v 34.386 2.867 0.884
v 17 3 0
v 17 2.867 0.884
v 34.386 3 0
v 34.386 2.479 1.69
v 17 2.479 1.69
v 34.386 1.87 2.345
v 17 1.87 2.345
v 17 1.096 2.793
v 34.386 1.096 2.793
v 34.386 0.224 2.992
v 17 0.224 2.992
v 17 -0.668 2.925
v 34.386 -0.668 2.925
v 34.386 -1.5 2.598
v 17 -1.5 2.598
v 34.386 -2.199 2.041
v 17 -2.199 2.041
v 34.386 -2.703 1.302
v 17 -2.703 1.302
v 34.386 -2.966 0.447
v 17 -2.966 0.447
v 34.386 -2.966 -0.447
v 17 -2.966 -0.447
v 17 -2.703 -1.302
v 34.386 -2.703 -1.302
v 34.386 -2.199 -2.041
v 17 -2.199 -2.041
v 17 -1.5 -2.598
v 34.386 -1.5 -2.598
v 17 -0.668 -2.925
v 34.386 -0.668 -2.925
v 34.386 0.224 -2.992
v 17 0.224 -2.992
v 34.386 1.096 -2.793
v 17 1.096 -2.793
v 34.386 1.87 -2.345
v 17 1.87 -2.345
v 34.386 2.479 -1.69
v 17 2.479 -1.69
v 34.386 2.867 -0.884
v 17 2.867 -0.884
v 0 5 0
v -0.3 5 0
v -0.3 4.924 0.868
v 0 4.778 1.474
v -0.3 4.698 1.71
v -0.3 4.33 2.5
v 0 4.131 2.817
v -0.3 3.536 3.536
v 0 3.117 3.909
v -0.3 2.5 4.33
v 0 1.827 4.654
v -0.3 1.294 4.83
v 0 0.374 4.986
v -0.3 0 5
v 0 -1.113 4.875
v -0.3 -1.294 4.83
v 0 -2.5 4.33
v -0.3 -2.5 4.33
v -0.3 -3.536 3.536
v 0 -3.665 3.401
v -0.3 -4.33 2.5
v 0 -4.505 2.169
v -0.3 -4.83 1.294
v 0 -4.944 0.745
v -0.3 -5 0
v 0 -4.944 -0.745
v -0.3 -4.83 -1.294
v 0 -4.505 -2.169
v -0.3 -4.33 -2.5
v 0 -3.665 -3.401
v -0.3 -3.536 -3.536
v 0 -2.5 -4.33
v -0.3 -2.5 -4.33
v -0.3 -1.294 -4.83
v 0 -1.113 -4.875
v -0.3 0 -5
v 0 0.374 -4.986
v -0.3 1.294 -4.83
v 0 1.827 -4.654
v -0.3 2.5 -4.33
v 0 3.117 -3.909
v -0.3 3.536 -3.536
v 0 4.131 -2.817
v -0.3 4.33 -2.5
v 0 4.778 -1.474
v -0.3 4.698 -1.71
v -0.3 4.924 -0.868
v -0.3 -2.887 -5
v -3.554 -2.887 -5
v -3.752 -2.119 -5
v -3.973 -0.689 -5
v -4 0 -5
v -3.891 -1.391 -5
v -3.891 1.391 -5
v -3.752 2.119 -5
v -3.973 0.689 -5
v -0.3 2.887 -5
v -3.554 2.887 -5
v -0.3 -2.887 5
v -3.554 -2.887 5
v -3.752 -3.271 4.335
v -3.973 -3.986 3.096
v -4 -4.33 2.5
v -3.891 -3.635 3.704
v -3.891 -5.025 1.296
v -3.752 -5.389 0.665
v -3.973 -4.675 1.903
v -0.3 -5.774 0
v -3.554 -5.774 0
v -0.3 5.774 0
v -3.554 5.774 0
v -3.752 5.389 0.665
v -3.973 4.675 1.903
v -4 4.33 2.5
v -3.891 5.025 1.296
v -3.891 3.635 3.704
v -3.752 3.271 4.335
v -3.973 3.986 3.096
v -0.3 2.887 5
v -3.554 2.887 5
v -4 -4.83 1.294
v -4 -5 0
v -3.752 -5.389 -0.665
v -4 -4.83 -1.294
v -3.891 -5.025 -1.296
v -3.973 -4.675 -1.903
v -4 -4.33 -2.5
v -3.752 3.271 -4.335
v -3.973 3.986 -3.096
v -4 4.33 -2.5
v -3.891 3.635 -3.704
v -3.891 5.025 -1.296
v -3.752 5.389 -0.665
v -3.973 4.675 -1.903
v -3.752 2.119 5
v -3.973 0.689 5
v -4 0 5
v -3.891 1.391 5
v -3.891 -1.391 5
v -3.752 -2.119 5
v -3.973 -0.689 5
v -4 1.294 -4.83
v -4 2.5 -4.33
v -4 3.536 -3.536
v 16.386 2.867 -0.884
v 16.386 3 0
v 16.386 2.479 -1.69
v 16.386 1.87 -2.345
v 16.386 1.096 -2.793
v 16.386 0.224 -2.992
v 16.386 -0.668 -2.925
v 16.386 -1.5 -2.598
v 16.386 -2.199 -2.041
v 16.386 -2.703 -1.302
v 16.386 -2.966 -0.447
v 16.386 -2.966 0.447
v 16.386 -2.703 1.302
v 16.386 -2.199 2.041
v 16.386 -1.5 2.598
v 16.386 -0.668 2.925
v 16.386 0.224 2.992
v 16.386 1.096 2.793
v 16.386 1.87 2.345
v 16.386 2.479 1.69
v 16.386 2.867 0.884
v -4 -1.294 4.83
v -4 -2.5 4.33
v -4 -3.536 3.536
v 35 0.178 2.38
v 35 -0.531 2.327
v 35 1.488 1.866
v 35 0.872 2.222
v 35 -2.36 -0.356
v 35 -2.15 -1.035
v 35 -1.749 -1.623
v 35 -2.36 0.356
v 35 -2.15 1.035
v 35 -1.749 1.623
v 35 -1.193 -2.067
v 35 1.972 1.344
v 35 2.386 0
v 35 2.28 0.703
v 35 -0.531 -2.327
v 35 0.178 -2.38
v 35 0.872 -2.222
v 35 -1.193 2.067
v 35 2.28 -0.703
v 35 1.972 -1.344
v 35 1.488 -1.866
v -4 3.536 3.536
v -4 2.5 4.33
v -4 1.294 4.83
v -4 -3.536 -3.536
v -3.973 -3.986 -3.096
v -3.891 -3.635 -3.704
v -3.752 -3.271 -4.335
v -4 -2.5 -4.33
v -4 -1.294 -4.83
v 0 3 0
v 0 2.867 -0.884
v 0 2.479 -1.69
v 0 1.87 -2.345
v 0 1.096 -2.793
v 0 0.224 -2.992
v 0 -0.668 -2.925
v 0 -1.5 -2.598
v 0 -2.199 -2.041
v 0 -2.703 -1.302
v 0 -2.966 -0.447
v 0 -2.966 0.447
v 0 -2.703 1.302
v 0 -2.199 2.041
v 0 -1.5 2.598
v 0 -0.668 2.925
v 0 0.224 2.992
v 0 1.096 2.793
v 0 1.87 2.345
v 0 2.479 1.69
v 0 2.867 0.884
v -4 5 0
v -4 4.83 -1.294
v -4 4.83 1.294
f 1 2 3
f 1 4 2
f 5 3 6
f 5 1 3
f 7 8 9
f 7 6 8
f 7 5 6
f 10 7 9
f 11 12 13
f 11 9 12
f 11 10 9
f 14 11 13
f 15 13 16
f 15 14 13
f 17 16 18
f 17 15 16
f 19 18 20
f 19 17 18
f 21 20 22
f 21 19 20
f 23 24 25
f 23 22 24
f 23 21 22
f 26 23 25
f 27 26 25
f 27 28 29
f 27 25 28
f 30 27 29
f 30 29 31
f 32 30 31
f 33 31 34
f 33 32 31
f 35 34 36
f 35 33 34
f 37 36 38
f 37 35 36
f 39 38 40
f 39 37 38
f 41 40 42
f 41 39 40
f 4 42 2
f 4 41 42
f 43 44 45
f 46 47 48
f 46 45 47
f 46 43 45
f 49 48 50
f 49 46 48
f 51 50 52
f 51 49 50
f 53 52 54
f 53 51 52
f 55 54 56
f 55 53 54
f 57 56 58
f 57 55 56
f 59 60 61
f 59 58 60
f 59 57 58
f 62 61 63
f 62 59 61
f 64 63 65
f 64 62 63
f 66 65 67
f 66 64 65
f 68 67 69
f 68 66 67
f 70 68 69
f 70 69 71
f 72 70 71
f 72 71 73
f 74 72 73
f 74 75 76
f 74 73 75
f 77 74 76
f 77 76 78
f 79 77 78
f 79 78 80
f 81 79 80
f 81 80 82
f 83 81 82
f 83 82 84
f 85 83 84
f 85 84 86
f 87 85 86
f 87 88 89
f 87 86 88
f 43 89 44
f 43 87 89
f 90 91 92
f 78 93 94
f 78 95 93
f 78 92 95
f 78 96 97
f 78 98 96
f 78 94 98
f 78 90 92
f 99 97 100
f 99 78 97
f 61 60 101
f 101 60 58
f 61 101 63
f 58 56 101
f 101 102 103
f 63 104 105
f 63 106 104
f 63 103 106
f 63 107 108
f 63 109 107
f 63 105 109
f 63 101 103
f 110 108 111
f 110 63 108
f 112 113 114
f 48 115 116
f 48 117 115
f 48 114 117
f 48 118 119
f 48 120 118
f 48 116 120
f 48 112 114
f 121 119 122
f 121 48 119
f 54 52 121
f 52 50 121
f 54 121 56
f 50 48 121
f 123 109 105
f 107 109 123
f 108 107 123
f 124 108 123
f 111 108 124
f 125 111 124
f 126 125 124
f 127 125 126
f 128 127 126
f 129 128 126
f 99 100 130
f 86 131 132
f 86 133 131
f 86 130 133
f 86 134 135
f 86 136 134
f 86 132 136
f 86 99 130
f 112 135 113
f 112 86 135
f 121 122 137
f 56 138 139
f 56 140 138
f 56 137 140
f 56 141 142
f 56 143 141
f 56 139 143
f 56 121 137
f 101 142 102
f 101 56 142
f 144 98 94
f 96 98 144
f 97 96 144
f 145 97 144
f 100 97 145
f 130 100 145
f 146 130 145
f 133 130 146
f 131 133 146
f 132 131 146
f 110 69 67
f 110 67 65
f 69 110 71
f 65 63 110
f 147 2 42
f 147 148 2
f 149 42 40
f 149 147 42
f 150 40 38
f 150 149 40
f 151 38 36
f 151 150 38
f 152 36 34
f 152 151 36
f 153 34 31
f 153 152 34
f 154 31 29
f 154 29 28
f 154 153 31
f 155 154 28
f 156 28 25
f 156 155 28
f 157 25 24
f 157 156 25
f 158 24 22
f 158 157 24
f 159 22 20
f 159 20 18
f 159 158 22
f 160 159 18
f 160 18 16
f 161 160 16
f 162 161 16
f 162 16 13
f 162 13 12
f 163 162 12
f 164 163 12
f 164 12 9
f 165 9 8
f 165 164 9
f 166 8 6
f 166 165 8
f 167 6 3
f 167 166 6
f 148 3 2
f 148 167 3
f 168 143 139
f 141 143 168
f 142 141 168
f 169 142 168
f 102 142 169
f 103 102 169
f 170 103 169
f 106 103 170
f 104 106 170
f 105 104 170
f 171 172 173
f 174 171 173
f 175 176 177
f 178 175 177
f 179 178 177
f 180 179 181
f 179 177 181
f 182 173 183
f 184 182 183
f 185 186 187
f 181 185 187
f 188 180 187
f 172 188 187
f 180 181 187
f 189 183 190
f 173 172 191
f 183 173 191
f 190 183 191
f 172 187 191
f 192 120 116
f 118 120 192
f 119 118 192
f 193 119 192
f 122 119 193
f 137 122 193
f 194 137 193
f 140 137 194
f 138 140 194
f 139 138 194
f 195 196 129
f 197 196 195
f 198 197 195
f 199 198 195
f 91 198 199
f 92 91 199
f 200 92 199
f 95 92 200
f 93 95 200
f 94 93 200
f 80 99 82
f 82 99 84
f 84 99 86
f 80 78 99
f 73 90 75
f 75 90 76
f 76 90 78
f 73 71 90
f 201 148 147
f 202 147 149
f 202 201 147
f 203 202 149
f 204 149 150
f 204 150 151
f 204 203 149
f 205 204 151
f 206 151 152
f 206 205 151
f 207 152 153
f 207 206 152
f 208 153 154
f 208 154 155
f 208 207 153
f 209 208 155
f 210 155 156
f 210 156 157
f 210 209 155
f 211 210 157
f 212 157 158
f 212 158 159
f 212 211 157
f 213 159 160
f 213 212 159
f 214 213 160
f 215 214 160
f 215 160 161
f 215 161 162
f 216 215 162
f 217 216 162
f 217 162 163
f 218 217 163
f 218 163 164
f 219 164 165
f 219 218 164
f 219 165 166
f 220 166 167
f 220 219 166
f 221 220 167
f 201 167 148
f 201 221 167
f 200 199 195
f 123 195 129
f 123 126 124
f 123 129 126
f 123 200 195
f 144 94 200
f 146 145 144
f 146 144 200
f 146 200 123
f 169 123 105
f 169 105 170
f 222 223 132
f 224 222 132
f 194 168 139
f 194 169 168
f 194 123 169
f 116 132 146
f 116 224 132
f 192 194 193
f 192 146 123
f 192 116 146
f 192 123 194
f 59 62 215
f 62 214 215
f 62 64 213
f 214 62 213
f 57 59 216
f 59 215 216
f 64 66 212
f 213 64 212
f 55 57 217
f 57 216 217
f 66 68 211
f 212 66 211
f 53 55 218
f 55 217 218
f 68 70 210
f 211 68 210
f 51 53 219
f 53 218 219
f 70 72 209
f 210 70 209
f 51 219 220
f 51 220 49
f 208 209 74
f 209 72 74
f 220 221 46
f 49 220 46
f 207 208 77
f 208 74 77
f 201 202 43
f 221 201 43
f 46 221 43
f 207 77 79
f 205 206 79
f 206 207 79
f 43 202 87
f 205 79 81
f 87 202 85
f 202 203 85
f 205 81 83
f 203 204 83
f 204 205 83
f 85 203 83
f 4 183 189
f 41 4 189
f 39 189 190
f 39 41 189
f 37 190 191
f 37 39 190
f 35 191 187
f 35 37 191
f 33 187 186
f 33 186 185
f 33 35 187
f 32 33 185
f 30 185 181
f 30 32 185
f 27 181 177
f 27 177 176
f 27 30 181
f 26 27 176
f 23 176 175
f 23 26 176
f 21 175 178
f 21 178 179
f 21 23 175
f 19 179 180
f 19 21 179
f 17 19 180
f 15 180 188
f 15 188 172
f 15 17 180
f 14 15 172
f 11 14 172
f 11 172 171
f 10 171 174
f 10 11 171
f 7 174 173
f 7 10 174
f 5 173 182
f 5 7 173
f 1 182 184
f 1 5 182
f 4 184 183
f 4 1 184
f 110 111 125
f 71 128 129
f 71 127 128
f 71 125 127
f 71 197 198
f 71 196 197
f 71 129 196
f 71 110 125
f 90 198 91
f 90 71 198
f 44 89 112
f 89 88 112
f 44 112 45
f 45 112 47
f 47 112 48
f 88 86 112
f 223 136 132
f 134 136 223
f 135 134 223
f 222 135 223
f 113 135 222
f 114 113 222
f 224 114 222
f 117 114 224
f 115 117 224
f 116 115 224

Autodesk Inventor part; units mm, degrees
ref_plane "YZ Plane" through (0, 0, 0) normal (1, 0, 0) x (0, 1, 0)
ref_plane "XZ Plane" through (0, 0, 0) normal (0, 1, 0) x (-1, 0, 0)
sketch "Sketch1" plane through (0, 0, 0) normal (0, 0, 1) x (1, 0, 0)
  line L0 (0, 5) -> (0, 3)
  line L1 (17, 3) -> (35, 3)
  line L2 (35, 3) -> (35, 0)
  line L3 (35, 0) -> (-0.3001, 0)
  line L4 (-7.3601, 0) -> (42.06, 0) projected
  line L5 (-0.3001, 0) -> (-0.3001, 5)
  line L6 (-0.3001, 5) -> (0, 5)
  line L7 (17, 3) -> (16.3865, 3)
  line L8 (16.3865, 3) -> (0, 3)
  line L9 (0, -1) -> (0, 6) projected
  dimension "d0" = 35
  dimension "d1" = 18
  dimension "d2" = 6
  dimension "d9" = 0.3001
  dimension "d10" = 10
  dimension "d13" = 0.6136
  dimension "d14" = 6
revolve "Body" add sketch "Sketch1" angle 360 about axis through (35, 0, 0) along (-1, 0, 0)
sketch "Sketch2" plane through (-0.3001, 0, 0) normal (-1, 0, 0) x (0, 0, 1)
  line L0 (0, 5.7735) -> (5, 2.8868)
  line L1 (5, 2.8868) -> (5, -2.8868)
  line L2 (5, -2.8868) -> (0, -5.7735)
  line L3 (0, -5.7735) -> (-5, -2.8868)
  line L4 (-5, -2.8868) -> (-5, 2.8868)
  line L5 (-5, 2.8868) -> (0, 5.7735)
  point P0 (0, 0)
  point P1 (0, 0)
  dimension "d11" = 10
extrude "Head" add sketch "Sketch2" along normal blind 3.7
sketch "Sketch4" plane through (0, 0, 0) normal (0, 0, 1) x (1, 0, 0)
  line L0 (-4.0001, 5) -> (-4.0001, 5.7735)
  line L1 (-4.0001, 5.7735) -> (-3.5535, 5.7735)
  line L2 (-3.5535, 5.7735) -> (-4.0001, 5)
  line L3 (-4.7401, 0) -> (0.4399, 0) projected
  line L4 (-0.3001, 5.7735) -> (-4.0001, 5.7735) projected
  line L5 (-4.0001, 2.8868) -> (-4.0001, 5.7735) projected
  dimension "d5" = 30
  dimension "d19" = 10
revolve "Chamfer1" cut sketch "Sketch4" angle 360 about axis through (-10, 0, 0) along (1, 0, 0)
thread "Thread" size "M6x1" class "6g" standard "ISO Metric profile" length 18
chamfer "Chamfer2" distance 0.6135 distance2 0.6136 1 edges at (35, -3, 0) measured on face at (35, 0.7485, -0.6631)
ref_plane "Work Plane1" through (1.525, 0, 0) normal (0, 0, 1) x (1, 0, 0)
equation "\"d11\" = SW"
equation "\"d3\" = KOH - SD"
equation "\"d15\" = GEL"
equation "\"d6\" = -0.5 * SPD + 0.5 * GD"
equation "\"d0\" = NLG"
equation "\"d1\" = GEL"
equation "\"d2\" = GD"
equation "\"d10\" = SD2"
equation "\"d14\" = BDM"
equation "\"d5\" = ANG1"
equation "\"d19\" = SW0"
equation "\"NLG\" = 35"
equation "\"GD\" = NND"
equation "\"BDM\" = NND"
equation "\"KOH\" = 4"
equation "\"GEL\" = 18"
equation "\"SW\" = 10"
equation "\"SW0\" = SW"
equation "\"SPD\" = NND - 1.2269 * PTC"
equation "\"SD2\" = SW"
equation "\"SD\" = WFT"
equation "\"ANG1\" = 30deg"
equation "\"GAL\" = 0.61345 * PTC"
equation "\"GUL\" = 0.61345 * PTC"
equation "\"RR\" = 0.25"
equation "\"WFT\" = 0.3"
equation "\"GD1\" = THREADDIA - 1.2269 * PTC"
equation "\"THREADDIA\" = 6"
equation "\"TOA\" = 30deg"
equation "\"PTC\" = 1"
equation "\"NND\" = 6"
equation "\"E0\" = 1.155 * SW"
properties part number "CNS 3121 - M6 x 35" material "Steel, Mild"
